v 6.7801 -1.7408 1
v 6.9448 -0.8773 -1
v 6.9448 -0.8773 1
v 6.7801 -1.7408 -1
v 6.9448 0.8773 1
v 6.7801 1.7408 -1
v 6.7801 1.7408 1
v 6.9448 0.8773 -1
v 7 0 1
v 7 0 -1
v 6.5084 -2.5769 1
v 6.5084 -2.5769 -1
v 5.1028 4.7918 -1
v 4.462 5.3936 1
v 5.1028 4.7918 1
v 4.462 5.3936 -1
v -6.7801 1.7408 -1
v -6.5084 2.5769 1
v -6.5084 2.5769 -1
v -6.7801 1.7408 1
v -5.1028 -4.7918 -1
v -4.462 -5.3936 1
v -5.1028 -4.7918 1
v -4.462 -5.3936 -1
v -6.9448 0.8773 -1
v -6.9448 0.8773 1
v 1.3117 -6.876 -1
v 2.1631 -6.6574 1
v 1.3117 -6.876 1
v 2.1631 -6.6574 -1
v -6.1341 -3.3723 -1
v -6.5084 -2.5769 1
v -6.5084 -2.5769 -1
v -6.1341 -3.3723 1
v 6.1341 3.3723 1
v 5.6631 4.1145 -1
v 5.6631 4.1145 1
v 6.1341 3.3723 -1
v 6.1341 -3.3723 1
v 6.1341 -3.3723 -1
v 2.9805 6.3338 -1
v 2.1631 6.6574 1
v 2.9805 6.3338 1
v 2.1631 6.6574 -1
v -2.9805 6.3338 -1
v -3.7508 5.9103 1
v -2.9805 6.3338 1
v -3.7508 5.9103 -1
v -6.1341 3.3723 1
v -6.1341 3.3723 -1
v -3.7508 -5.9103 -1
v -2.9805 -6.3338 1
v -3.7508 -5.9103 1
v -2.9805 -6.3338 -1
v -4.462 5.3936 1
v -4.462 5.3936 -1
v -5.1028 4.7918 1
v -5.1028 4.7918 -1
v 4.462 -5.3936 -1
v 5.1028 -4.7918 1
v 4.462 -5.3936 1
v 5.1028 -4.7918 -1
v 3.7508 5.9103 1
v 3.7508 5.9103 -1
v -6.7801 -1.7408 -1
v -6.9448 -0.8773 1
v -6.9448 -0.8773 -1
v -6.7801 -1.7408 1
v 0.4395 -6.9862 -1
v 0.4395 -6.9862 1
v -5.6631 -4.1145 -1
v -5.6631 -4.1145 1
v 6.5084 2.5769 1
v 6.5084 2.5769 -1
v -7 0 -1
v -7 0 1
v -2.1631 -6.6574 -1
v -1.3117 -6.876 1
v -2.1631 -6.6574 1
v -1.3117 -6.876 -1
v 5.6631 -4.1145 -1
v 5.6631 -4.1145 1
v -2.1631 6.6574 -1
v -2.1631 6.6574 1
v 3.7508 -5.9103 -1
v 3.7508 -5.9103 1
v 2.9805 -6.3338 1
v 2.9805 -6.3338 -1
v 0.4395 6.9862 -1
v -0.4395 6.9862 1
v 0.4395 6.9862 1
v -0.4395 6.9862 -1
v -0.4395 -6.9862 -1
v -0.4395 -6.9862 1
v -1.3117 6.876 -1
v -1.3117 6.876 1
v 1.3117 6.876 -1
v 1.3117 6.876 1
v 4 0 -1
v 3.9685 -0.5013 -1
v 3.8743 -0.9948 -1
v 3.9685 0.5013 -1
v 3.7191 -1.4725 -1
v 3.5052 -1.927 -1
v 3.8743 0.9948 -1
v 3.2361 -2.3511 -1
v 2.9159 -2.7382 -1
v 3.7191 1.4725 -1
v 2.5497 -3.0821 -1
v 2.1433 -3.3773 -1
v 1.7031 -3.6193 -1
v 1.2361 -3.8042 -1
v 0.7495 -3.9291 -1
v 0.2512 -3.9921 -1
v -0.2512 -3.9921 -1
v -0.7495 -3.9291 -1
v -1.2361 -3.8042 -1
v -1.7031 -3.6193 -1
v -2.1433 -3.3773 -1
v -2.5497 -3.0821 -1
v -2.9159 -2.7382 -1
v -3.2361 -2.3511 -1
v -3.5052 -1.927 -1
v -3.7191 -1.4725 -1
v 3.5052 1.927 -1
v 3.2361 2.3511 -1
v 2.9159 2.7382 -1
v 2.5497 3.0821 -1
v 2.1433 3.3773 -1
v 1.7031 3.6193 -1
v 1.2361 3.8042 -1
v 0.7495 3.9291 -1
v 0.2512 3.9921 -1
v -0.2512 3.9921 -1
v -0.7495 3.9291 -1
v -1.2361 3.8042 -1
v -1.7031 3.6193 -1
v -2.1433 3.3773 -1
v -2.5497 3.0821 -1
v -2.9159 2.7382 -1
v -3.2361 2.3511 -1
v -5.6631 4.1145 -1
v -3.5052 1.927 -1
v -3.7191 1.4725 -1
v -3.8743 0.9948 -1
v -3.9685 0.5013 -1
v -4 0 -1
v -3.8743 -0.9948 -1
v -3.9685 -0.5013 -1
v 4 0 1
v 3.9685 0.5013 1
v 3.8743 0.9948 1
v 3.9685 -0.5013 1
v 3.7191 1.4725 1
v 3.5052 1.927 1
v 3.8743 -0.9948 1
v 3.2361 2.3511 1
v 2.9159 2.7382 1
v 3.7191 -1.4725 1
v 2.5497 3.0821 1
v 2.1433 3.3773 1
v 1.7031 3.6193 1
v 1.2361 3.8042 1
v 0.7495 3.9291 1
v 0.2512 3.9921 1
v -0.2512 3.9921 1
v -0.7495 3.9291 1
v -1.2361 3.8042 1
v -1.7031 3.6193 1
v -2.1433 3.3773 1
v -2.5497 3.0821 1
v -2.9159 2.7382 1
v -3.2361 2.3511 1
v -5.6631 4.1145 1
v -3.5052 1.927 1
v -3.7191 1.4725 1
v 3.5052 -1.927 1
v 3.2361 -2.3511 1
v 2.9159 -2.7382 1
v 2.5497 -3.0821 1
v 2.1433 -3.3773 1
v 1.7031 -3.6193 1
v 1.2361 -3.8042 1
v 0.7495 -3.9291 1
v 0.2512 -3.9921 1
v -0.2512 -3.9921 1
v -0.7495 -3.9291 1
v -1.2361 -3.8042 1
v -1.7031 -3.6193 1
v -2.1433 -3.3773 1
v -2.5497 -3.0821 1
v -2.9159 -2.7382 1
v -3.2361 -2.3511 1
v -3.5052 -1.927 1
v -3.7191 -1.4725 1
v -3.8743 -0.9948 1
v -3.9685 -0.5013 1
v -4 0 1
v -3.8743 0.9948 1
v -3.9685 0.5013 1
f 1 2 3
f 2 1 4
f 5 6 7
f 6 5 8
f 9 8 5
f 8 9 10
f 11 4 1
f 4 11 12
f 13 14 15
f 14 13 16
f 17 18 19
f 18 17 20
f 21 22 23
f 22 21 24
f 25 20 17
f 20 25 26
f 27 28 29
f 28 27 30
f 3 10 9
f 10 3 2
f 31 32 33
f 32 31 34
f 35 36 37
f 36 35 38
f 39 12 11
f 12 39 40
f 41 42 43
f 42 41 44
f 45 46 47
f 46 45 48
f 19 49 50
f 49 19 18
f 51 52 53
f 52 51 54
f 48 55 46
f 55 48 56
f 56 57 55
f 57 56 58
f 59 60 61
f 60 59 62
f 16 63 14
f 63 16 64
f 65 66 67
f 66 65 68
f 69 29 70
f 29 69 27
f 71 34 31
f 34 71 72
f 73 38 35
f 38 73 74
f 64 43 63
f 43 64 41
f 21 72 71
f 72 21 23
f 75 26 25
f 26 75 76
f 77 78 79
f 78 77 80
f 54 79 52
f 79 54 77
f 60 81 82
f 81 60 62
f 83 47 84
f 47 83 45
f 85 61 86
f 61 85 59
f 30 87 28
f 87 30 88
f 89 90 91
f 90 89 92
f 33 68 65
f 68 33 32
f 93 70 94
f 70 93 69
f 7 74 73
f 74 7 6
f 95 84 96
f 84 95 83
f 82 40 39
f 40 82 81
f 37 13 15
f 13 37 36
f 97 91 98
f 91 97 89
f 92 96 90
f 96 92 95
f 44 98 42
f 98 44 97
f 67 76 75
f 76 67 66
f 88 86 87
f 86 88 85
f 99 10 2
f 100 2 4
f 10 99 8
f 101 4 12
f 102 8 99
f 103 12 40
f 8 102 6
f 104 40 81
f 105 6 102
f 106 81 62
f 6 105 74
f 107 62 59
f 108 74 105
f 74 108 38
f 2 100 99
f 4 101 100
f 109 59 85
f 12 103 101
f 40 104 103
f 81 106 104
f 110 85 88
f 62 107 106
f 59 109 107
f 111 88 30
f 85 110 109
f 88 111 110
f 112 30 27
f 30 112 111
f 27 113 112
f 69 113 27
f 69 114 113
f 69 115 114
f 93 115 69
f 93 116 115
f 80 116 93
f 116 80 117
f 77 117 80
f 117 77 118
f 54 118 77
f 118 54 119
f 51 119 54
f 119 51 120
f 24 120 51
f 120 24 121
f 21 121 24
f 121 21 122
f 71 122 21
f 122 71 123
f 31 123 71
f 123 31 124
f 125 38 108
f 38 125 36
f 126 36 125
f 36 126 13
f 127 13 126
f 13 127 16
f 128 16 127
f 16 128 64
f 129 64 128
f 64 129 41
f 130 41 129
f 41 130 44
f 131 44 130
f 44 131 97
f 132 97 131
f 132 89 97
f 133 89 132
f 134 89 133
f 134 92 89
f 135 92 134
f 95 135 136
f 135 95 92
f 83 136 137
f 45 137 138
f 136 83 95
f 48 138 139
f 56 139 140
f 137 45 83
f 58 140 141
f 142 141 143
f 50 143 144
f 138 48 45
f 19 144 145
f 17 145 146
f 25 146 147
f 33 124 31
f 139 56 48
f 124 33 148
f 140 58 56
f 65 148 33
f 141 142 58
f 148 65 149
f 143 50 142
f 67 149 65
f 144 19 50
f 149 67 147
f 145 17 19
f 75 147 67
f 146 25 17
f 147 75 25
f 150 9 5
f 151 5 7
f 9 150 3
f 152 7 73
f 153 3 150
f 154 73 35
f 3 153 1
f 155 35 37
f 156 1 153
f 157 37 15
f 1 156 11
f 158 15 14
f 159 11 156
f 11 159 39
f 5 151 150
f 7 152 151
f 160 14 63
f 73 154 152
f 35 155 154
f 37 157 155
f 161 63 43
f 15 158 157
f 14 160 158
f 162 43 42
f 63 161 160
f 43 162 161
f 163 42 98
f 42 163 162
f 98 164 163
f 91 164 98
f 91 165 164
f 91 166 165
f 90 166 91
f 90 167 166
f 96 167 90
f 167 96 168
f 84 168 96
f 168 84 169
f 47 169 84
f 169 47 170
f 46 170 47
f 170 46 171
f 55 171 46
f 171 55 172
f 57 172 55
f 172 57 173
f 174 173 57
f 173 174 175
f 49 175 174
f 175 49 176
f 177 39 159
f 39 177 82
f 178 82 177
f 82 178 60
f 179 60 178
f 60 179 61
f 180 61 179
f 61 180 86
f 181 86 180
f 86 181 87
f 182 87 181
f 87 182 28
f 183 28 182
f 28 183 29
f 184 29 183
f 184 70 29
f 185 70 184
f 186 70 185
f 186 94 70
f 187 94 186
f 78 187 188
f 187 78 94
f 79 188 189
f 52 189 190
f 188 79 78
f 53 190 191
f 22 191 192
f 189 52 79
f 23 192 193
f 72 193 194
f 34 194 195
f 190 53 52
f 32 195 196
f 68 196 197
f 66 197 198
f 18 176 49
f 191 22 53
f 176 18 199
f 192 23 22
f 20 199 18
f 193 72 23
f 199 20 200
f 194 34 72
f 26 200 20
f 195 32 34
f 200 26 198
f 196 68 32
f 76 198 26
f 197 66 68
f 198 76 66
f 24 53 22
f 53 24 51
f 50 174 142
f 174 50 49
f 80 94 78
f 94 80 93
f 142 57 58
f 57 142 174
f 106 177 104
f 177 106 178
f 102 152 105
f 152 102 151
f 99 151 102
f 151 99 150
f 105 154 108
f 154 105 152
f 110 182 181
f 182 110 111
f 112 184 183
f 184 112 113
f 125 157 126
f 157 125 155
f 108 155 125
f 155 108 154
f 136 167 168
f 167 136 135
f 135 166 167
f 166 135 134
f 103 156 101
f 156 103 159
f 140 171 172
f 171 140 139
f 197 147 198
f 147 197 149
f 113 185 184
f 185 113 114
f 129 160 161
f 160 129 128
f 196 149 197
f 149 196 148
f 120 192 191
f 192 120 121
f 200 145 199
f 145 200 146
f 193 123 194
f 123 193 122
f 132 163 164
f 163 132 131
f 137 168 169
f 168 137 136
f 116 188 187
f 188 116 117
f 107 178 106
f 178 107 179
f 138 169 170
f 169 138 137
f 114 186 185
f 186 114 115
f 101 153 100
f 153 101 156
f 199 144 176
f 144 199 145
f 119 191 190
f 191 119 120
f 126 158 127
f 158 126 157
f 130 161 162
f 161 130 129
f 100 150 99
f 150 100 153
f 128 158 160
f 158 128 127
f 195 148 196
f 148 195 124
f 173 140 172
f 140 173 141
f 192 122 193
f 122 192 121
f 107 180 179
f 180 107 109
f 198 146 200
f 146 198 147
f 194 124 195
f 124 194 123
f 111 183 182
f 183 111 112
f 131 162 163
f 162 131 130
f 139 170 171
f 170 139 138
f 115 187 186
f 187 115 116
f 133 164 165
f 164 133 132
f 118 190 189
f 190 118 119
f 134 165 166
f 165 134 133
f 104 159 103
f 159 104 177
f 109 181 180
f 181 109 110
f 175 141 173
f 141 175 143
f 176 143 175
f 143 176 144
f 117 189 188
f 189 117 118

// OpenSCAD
$fn = 50;


difference() {
	union() {
		translate(v = [0, 0, -1.0000000000]) {
			cylinder(h = 2, r = 7.0000000000);
		}
	}
	union() {
		translate(v = [0, 0, -100.0000000000]) {
			cylinder(h = 200, r = 4.0000000000);
		}
	}
}
